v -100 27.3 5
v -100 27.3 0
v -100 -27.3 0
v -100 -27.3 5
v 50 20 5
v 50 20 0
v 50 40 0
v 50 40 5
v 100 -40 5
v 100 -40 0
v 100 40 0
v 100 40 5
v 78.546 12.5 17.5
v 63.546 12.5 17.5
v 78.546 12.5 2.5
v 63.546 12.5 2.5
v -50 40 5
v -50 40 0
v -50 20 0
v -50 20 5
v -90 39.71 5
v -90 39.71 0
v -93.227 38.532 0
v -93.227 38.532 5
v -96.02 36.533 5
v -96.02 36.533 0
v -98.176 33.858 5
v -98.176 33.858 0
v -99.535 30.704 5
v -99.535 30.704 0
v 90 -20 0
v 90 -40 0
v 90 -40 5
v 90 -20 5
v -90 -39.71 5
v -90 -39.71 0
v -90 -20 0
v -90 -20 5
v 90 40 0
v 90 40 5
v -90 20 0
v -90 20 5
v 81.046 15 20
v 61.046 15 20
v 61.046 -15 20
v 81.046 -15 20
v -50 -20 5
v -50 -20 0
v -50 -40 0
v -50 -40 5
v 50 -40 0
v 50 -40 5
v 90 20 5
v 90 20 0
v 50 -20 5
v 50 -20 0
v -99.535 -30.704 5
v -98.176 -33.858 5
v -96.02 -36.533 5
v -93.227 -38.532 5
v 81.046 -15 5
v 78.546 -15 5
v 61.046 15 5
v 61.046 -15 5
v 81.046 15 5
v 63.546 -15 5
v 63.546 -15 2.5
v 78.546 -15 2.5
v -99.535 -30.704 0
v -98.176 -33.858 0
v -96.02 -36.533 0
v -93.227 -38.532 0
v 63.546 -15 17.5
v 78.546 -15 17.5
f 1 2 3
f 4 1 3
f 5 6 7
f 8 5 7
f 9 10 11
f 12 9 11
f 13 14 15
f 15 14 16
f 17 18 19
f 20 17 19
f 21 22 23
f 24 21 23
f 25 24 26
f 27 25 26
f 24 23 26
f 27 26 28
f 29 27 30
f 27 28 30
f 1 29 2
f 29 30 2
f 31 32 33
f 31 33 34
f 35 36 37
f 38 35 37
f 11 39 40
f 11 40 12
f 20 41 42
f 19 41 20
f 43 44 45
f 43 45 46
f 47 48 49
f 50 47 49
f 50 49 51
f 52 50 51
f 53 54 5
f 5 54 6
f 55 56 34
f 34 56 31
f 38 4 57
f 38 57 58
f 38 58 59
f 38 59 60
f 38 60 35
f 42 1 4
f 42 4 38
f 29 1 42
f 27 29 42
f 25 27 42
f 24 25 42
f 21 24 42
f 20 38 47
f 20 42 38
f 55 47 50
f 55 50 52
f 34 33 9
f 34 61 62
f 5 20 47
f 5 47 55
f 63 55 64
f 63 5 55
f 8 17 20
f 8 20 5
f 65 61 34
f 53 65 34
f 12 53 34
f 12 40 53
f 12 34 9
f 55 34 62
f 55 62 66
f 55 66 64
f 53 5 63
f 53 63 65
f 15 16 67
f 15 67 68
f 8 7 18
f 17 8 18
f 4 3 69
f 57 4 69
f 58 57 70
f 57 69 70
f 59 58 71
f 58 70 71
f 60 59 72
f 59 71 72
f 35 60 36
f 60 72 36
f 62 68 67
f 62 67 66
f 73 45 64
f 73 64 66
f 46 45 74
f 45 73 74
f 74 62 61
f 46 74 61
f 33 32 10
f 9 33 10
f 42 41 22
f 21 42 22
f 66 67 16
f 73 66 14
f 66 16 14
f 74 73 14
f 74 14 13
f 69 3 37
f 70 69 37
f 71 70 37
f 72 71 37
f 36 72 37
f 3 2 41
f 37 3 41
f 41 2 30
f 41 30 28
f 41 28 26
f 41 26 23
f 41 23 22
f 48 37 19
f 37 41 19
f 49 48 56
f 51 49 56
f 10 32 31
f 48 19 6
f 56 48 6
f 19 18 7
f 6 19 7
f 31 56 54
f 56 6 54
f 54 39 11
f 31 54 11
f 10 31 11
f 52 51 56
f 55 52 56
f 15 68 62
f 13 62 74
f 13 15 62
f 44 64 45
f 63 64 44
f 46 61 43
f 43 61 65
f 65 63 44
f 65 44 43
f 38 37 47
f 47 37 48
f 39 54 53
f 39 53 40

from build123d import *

# Parameters (mm, degrees)
F0_W        = 20
F0_H        = 30
F1_DEPTH    = 20
F0_W_2      = 10
F0_H_2      = 40
F0_W_3      = 40
F0_H_3      = 20
F2_DEPTH    = 5
F3_T        = 2.5
F3_T3_DEPTH = 25
F3_T5_DEPTH = 35
F3_T7_DEPTH = 10


# Not quite as in the source:
# - a shell that OpenCascade refuses in one call is made with other operations: the cavity is built on its own and cut out


with BuildPart() as f1:
    # F0 (on Top) → F1 (new body)
    with BuildSketch(Plane.XY):
        with Locations((71.046166122, 0)):
            Rectangle(F0_W, F0_H)
    extrude(amount=F1_DEPTH)

    # F0 (on Top) → F2 (join)
    with BuildSketch(Plane.XY):
        with BuildLine():
            ThreePointArc((-90, 39.709673646), (-97.1888826467, 35.2686887253), (-100, 27.3))
            Line((-100, 27.3), (-100, 20))
            Line((-100, 20), (-90, 20))
            Line((-90, 20), (-90, 39.709673646))
        make_face()
        with Locations((-95, 0)):
            Rectangle(F0_W_2, F0_H_2)
        with BuildLine():
            Line((-90, -20), (-100, -20))
            Line((-100, -20), (-100, -27.3))
            ThreePointArc((-100, -27.3), (-97.1888826467, -35.2686887253), (-90, -39.709673646))
            Line((-90, -39.709673646), (-90, -20))
        make_face()
        with Locations((-70, 0)):
            Rectangle(F0_W_3, F0_H_2)
        Polygon((-50, 40), (-50, 20), (-50, -20), (-50, -40), (50, -40), (50, -20), (50, 20), (50, 40), align=None)
        with Locations((70, 0)):
            Rectangle(F0_W_3, F0_H_2)
        with Locations((71.046166122, 0)):
            Rectangle(F0_W, F0_H, mode=Mode.SUBTRACT)
        with Locations((95, 0)):
            Rectangle(F0_W_2, F0_H_2)
        with Locations((95, -30)):
            Rectangle(F0_W_2, F0_H_3)
        with Locations((95, 30)):
            Rectangle(F0_W_2, F0_H_3)
    extrude(amount=F2_DEPTH)

    # F3: shell of thickness 2.5, made by hand


with BuildPart() as f3_core1:
    # F3_t2: copy of F1
    add(f1.part)

    # the walls: a layer under each face that stays
    f3_faces = [f3_core1.faces().sort_by_distance(p)[0] for p in [
        (71.046166122, 15, 12.5),
        (0, 0, 5),
        (61.046166122, 0, 12.5),
        (71.046166122, 0, 20),
        (81.046166122, 0, 12.5),
        (-97.1888826467, 35.2686887253, 2.5),
        (-100, 0, 2.5),
        (-97.1888826467, -35.2686887253, 2.5),
        (-90, -29.854836823, 2.5),
        (-70, -20, 2.5),
        (-50, -30, 2.5),
        (0, -40, 2.5),
        (50, -30, 2.5),
        (70, -20, 2.5),
        (90, -30, 2.5),
        (95, -40, 2.5),
        (100, 0, 2.5),
        (95, 40, 2.5),
        (90, 30, 2.5),
        (70, 20, 2.5),
        (50, 30, 2.5),
        (0, 40, 2.5),
        (-50, 30, 2.5),
        (-70, 20, 2.5),
        (-90, 29.854836823, 2.5),
        (0, 0, 0),
    ]]
    thicken(f3_faces, amount=-F3_T, mode=Mode.SUBTRACT)

    # F3_s4 → F3_t3 (cut)
    with BuildSketch(Plane.YZ.offset(58.546166122)):
        Polygon((15.025, 5.025), (12.5, 5), (12.5, 2.5), (15, 2.5), align=None)
    extrude(amount=F3_T3_DEPTH, mode=Mode.SUBTRACT)

    # F3_s6 → F3_t5 (cut)
    with BuildSketch(Plane.XZ.offset(-17.5)):
        Polygon((61.021166122, 5.025), (61.046166122, 2.5), (63.546166122, 2.5), (63.546166122, 5), align=None)
        Polygon((81.071166122, 5.025), (81.046166122, 2.5), (78.546166122, 2.5), (78.546166122, 5), align=None)
    extrude(amount=F3_T5_DEPTH, mode=Mode.SUBTRACT)

    # F3_s8 → F3_t7 (cut)
    with BuildSketch(Plane.XY.offset(-2.5)):
        Polygon((-89.975, -20.025), (-92.5, -20), (-92.5, -17.5), (-90, -17.5), align=None)
        Polygon((-50.025, -20.025), (-50, -17.5), (-47.5, -17.5), (-47.5, -20), align=None)
        Polygon((50.025, -20.025), (47.5, -20), (47.5, -17.5), (50, -17.5), align=None)
        Polygon((89.975, -20.025), (90, -17.5), (92.5, -17.5), (92.5, -20), align=None)
        Polygon((89.975, 20.025), (92.5, 20), (92.5, 17.5), (90, 17.5), align=None)
        Polygon((50.025, 20.025), (50, 17.5), (47.5, 17.5), (47.5, 20), align=None)
        Polygon((-50.025, 20.025), (-47.5, 20), (-47.5, 17.5), (-50, 17.5), align=None)
        Polygon((-89.975, 20.025), (-90, 17.5), (-92.5, 17.5), (-92.5, 20), align=None)
    extrude(amount=F3_T7_DEPTH, mode=Mode.SUBTRACT)


with BuildPart() as f1_1:
    add(f1.part)

    # what is left inside the walls is the cavity
    f3_cavity = [f3_core1.part.solids().sort_by_distance(p)[0] for p in [
        (71.046166, -5.833333, 17.475),
    ]]
    add(f3_cavity, mode=Mode.SUBTRACT)


solid = f1_1.part
